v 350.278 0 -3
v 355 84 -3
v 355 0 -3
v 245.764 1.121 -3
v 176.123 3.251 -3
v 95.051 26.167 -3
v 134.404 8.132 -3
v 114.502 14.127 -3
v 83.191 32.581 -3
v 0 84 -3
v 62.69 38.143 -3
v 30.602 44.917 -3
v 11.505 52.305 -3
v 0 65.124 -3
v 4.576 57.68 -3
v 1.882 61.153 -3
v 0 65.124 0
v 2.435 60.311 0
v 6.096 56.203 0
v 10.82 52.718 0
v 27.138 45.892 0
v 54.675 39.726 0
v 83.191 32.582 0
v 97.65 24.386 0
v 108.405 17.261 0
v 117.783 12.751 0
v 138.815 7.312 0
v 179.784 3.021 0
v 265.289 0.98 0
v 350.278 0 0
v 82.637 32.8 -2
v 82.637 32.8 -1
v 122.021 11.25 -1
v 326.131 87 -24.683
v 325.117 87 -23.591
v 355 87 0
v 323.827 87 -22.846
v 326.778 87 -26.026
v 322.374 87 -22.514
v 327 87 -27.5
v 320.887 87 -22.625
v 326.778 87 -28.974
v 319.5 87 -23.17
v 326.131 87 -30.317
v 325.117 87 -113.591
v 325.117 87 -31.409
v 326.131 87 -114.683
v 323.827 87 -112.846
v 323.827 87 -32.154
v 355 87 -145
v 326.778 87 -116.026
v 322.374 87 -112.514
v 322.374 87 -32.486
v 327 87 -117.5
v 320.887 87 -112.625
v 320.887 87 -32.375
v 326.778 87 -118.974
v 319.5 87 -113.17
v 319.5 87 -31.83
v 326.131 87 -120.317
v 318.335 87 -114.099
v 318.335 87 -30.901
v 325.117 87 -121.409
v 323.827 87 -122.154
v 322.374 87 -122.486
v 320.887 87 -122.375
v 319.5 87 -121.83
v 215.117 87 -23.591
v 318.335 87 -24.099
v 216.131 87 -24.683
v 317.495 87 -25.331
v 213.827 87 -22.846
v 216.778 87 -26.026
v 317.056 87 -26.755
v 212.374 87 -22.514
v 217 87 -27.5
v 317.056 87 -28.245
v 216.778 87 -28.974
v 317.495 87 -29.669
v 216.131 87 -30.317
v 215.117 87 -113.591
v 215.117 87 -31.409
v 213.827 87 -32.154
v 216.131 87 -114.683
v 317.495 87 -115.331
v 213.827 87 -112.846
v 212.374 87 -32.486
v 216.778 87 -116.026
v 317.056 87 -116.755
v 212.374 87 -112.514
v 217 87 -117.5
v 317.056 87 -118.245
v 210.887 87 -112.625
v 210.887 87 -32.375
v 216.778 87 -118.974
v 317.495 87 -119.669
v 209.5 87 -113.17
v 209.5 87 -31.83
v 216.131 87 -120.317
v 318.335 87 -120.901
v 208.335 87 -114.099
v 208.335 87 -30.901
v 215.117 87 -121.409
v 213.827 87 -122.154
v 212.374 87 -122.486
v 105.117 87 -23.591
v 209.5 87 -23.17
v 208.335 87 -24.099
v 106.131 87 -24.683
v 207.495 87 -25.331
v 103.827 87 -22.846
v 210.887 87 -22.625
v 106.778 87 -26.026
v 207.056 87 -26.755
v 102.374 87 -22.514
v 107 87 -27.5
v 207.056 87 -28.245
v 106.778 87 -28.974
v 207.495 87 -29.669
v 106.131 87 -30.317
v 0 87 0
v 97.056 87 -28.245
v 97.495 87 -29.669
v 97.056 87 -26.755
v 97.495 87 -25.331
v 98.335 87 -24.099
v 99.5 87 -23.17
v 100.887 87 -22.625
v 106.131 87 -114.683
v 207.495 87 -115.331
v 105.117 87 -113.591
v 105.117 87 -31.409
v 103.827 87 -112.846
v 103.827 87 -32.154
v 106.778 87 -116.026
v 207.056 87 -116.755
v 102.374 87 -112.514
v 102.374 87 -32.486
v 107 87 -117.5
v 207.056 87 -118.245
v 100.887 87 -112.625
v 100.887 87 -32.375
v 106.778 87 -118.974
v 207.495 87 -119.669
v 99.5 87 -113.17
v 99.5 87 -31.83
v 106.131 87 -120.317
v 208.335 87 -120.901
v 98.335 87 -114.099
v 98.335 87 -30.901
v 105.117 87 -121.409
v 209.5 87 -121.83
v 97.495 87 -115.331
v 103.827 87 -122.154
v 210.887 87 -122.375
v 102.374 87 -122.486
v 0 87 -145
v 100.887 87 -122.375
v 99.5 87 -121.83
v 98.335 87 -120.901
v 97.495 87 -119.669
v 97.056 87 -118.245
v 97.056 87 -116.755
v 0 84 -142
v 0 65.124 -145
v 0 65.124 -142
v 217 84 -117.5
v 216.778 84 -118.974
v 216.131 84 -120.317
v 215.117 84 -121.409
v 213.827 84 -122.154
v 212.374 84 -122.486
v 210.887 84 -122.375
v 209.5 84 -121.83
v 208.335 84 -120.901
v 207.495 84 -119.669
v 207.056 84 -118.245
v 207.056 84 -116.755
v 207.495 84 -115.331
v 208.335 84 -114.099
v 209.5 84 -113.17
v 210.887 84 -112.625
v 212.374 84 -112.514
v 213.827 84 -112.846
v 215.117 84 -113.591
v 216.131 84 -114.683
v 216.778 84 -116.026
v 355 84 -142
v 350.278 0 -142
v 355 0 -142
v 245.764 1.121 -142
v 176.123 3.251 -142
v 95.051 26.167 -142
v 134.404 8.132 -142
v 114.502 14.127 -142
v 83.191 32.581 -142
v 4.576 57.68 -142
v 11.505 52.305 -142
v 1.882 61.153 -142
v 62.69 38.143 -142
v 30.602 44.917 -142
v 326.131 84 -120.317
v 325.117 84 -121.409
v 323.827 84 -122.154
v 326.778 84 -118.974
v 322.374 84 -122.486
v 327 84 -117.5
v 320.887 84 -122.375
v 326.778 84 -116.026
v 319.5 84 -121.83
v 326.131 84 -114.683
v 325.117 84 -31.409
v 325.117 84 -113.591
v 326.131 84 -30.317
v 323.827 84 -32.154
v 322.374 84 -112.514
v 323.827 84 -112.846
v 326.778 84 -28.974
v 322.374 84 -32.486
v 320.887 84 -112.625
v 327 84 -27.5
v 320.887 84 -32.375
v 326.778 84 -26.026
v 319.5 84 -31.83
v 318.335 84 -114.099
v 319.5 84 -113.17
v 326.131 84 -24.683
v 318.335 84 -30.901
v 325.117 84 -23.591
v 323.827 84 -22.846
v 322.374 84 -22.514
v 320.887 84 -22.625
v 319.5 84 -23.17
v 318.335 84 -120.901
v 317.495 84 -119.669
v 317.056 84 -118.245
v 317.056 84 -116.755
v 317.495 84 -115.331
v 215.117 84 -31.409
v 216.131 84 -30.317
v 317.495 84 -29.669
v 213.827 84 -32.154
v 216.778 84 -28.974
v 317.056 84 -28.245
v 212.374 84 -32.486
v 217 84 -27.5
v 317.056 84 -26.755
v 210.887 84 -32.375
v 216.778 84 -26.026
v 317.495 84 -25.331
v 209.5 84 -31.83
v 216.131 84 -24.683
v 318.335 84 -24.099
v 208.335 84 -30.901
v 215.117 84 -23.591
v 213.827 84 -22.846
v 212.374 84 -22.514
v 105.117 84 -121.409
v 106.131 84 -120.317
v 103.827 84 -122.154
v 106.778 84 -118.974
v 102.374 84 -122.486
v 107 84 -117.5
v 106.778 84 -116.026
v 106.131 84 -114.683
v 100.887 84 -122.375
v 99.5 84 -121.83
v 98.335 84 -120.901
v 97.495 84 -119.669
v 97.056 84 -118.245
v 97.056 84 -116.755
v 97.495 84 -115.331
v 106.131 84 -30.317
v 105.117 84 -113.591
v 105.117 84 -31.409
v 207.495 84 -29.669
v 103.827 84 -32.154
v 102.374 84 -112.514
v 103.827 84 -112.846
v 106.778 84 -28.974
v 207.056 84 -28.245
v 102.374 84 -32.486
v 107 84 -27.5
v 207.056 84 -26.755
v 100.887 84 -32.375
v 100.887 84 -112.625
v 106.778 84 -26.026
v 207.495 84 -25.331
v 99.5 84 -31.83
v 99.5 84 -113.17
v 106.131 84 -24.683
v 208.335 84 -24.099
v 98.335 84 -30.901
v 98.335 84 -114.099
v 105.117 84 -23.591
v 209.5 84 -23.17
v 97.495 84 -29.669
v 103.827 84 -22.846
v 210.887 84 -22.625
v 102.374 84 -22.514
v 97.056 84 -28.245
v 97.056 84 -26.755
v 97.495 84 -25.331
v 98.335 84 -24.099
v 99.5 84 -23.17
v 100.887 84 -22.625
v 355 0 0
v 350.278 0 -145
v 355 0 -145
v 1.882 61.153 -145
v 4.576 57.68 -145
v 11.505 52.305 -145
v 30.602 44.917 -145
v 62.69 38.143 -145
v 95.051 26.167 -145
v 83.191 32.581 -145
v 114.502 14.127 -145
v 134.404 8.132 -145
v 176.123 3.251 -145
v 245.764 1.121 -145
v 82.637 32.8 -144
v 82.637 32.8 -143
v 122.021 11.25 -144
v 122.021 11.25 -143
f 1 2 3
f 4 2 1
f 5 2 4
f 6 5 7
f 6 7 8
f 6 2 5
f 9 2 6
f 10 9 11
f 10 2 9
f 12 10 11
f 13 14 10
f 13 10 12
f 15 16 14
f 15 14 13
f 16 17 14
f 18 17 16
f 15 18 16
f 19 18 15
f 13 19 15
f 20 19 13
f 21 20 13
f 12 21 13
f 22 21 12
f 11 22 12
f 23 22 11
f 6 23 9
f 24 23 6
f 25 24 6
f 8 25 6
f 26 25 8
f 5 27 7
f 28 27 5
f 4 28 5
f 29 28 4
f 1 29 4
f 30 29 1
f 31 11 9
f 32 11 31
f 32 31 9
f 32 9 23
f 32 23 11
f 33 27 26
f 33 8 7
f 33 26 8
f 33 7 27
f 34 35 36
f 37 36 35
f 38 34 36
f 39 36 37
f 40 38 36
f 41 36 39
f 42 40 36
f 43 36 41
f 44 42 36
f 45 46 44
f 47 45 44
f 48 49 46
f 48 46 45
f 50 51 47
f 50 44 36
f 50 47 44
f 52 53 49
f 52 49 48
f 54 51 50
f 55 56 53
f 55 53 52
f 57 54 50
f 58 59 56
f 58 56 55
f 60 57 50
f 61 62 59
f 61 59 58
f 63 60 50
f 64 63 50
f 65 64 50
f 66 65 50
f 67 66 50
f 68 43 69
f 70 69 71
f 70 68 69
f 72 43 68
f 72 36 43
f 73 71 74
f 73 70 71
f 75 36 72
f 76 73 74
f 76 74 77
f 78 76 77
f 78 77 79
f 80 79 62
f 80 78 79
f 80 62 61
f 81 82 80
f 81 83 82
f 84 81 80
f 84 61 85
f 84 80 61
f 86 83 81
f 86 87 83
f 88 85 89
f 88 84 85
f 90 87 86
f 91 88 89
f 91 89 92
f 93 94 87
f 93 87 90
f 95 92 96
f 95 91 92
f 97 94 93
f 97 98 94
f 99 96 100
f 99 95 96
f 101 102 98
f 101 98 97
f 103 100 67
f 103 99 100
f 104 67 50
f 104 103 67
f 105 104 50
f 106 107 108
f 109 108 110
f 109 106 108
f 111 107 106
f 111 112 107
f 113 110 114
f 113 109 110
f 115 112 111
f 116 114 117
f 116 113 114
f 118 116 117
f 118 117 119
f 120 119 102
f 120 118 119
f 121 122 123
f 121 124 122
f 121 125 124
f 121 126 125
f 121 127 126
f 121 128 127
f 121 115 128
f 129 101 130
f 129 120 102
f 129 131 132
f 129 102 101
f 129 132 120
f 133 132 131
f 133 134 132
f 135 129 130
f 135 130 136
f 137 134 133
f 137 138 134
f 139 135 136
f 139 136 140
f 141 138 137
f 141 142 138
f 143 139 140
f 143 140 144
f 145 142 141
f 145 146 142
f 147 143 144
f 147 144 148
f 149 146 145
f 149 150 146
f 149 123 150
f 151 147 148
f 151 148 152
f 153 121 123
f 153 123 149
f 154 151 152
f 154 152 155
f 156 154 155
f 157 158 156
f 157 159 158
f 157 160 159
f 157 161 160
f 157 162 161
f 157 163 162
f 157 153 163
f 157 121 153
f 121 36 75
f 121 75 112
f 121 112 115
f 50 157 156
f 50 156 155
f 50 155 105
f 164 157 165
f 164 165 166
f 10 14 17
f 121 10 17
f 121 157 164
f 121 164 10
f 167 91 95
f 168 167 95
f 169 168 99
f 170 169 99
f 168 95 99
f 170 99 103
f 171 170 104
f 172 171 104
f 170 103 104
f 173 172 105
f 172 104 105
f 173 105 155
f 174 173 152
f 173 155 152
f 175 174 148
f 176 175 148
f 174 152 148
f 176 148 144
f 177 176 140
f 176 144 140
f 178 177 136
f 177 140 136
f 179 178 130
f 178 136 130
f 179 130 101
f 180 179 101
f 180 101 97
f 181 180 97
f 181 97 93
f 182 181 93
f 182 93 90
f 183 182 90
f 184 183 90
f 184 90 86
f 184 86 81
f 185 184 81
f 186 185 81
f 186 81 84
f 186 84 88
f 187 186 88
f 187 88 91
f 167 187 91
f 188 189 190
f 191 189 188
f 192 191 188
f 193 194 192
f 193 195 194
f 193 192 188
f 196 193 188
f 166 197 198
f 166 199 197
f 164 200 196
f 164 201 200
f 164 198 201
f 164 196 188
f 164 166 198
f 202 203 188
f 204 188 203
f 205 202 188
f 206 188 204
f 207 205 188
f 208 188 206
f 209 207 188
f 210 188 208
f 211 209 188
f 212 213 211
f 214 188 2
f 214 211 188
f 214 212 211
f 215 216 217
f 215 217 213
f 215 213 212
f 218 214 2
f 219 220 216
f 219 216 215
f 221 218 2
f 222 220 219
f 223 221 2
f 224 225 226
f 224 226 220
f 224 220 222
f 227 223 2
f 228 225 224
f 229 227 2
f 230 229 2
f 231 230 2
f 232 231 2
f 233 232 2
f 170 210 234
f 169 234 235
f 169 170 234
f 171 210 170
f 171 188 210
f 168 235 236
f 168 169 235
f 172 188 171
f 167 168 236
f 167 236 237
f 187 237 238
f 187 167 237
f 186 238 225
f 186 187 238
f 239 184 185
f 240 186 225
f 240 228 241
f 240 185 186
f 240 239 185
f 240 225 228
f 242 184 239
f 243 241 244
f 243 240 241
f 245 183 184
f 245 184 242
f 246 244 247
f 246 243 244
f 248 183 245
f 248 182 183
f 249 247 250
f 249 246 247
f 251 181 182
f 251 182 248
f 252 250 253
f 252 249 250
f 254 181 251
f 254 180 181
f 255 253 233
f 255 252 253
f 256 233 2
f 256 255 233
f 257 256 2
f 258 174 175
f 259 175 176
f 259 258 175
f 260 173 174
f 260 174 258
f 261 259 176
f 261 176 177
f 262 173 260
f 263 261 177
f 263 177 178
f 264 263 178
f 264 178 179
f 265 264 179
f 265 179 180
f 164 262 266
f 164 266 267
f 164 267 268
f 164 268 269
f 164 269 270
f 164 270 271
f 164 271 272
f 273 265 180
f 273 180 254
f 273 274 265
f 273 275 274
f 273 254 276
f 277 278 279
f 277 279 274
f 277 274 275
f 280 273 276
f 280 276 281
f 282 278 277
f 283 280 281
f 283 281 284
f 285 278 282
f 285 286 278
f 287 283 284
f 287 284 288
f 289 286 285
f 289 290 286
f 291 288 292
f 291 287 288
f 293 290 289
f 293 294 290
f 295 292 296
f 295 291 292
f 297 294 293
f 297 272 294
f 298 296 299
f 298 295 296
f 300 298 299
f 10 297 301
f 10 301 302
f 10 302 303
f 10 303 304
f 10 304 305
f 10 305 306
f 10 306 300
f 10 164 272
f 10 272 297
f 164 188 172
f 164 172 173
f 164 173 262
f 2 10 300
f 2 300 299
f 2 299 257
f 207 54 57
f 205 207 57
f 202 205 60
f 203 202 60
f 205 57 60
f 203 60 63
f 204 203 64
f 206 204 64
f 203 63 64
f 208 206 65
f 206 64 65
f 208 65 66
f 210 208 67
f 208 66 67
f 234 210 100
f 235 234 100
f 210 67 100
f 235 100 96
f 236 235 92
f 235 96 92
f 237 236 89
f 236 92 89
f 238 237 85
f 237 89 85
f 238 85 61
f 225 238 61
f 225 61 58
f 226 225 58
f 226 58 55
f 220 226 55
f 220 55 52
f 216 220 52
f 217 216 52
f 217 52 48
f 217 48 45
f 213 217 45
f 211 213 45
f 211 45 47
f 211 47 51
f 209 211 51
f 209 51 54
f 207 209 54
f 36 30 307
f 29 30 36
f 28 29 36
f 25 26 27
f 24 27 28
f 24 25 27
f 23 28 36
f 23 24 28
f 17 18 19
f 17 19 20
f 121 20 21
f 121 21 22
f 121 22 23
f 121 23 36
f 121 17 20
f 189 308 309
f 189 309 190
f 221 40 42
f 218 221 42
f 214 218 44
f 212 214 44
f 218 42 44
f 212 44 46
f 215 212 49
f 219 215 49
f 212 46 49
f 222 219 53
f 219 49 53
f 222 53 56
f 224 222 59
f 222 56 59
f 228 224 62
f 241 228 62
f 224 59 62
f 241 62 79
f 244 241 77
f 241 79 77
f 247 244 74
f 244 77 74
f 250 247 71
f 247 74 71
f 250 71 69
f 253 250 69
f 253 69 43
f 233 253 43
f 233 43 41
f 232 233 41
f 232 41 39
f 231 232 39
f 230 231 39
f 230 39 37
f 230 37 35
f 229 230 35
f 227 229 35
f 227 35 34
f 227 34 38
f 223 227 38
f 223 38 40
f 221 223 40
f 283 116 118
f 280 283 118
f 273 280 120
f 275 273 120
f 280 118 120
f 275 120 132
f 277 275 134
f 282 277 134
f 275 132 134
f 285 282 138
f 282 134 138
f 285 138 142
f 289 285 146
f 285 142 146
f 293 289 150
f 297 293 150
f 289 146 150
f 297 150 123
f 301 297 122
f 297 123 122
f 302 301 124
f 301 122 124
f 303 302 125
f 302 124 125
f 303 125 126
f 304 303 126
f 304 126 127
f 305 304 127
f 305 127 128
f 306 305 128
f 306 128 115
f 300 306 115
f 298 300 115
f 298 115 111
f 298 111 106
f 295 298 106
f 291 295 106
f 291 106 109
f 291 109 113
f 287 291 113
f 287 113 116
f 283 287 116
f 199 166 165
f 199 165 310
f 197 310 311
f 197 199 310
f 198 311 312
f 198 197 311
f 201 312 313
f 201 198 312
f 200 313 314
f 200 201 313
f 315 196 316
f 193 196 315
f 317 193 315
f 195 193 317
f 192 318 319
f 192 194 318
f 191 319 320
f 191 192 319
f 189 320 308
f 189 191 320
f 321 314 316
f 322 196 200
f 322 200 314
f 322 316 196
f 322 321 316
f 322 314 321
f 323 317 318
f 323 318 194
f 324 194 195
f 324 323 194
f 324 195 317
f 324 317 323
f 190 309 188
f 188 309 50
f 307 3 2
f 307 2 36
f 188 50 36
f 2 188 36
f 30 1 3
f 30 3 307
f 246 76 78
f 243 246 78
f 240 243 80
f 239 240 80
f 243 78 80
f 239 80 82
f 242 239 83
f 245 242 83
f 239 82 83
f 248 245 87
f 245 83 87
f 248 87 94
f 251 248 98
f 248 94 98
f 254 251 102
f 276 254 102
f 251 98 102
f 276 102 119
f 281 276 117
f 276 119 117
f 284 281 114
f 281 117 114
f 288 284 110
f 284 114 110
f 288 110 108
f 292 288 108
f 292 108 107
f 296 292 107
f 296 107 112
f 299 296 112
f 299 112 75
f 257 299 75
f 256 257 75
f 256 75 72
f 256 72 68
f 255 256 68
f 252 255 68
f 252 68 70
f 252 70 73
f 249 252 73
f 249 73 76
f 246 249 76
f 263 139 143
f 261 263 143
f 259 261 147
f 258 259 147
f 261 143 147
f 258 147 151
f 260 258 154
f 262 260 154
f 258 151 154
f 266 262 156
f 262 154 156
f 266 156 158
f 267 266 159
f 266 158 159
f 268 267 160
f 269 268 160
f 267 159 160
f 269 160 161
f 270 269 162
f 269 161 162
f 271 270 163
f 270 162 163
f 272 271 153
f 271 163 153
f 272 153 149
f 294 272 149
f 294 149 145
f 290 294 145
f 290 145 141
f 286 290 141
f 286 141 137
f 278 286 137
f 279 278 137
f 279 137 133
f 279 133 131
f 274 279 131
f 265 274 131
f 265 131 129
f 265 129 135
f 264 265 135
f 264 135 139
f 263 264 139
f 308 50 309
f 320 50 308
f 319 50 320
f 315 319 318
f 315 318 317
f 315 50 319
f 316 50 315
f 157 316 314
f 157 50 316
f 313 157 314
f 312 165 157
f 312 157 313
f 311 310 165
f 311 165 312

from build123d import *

# Parameters (mm, degrees)
EXTRUDE_1_DEPTH     = 355
CUT_EXTRUDE_1_DEPTH = 146
SKETCH_3_R          = 5
CUT_EXTRUDE_2_DEPTH = 10


with BuildPart() as part:
    # Эскиз1 → Вытянуть-Тонкостенный1 (new body)
    with BuildSketch(Plane(origin=(0, 0, 0), x_dir=(0, 0, -1), z_dir=(1, 0, 0))):
        Polygon((0, 0), (0, 87), (145, 87), (145, 0), (142, 0), (142, 84), (3, 84), (3, 0), align=None)
    extrude(amount=EXTRUDE_1_DEPTH)

    # Эскиз2 → Вырез-Вытянуть1 (cut, through all)
    with BuildSketch(Plane.XY):
        with BuildLine():
            Line((0, 65.12405332), (0, 0))
            Line((0, 0), (350.278484056, 0))
            add(Edge.make_bspline(
                [(0, 65.12405332), (7.933841156, 41.786887325), (88.835587811, 42.671964813), (115.548592719, -4.570720396), (275.808566843, 2.451761606), (350.278484056, 0)],
                knots=[0, 0, 0, 0, 0.332901295, 0.537301133, 1, 1, 1, 1], degree=3))
        make_face()
    extrude(amount=-CUT_EXTRUDE_1_DEPTH, mode=Mode.SUBTRACT)

    # Эскиз3 → Вырез-Вытянуть2 (cut)
    with BuildSketch(Plane(origin=(0, 87, 0), x_dir=(1, 0, 0), z_dir=(0, 1, 0))):
        with Locations((322, 117.5)):
            Circle(SKETCH_3_R)
        with Locations((212, 117.5)):
            Circle(SKETCH_3_R)
        with Locations((102, 117.5)):
            Circle(SKETCH_3_R)
        with Locations((212, 27.5)):
            Circle(SKETCH_3_R)
        with Locations((102, 27.5)):
            Circle(SKETCH_3_R)
        with Locations((322, 27.5)):
            Circle(SKETCH_3_R)
    extrude(amount=-CUT_EXTRUDE_2_DEPTH, mode=Mode.SUBTRACT)


solid = part.part
